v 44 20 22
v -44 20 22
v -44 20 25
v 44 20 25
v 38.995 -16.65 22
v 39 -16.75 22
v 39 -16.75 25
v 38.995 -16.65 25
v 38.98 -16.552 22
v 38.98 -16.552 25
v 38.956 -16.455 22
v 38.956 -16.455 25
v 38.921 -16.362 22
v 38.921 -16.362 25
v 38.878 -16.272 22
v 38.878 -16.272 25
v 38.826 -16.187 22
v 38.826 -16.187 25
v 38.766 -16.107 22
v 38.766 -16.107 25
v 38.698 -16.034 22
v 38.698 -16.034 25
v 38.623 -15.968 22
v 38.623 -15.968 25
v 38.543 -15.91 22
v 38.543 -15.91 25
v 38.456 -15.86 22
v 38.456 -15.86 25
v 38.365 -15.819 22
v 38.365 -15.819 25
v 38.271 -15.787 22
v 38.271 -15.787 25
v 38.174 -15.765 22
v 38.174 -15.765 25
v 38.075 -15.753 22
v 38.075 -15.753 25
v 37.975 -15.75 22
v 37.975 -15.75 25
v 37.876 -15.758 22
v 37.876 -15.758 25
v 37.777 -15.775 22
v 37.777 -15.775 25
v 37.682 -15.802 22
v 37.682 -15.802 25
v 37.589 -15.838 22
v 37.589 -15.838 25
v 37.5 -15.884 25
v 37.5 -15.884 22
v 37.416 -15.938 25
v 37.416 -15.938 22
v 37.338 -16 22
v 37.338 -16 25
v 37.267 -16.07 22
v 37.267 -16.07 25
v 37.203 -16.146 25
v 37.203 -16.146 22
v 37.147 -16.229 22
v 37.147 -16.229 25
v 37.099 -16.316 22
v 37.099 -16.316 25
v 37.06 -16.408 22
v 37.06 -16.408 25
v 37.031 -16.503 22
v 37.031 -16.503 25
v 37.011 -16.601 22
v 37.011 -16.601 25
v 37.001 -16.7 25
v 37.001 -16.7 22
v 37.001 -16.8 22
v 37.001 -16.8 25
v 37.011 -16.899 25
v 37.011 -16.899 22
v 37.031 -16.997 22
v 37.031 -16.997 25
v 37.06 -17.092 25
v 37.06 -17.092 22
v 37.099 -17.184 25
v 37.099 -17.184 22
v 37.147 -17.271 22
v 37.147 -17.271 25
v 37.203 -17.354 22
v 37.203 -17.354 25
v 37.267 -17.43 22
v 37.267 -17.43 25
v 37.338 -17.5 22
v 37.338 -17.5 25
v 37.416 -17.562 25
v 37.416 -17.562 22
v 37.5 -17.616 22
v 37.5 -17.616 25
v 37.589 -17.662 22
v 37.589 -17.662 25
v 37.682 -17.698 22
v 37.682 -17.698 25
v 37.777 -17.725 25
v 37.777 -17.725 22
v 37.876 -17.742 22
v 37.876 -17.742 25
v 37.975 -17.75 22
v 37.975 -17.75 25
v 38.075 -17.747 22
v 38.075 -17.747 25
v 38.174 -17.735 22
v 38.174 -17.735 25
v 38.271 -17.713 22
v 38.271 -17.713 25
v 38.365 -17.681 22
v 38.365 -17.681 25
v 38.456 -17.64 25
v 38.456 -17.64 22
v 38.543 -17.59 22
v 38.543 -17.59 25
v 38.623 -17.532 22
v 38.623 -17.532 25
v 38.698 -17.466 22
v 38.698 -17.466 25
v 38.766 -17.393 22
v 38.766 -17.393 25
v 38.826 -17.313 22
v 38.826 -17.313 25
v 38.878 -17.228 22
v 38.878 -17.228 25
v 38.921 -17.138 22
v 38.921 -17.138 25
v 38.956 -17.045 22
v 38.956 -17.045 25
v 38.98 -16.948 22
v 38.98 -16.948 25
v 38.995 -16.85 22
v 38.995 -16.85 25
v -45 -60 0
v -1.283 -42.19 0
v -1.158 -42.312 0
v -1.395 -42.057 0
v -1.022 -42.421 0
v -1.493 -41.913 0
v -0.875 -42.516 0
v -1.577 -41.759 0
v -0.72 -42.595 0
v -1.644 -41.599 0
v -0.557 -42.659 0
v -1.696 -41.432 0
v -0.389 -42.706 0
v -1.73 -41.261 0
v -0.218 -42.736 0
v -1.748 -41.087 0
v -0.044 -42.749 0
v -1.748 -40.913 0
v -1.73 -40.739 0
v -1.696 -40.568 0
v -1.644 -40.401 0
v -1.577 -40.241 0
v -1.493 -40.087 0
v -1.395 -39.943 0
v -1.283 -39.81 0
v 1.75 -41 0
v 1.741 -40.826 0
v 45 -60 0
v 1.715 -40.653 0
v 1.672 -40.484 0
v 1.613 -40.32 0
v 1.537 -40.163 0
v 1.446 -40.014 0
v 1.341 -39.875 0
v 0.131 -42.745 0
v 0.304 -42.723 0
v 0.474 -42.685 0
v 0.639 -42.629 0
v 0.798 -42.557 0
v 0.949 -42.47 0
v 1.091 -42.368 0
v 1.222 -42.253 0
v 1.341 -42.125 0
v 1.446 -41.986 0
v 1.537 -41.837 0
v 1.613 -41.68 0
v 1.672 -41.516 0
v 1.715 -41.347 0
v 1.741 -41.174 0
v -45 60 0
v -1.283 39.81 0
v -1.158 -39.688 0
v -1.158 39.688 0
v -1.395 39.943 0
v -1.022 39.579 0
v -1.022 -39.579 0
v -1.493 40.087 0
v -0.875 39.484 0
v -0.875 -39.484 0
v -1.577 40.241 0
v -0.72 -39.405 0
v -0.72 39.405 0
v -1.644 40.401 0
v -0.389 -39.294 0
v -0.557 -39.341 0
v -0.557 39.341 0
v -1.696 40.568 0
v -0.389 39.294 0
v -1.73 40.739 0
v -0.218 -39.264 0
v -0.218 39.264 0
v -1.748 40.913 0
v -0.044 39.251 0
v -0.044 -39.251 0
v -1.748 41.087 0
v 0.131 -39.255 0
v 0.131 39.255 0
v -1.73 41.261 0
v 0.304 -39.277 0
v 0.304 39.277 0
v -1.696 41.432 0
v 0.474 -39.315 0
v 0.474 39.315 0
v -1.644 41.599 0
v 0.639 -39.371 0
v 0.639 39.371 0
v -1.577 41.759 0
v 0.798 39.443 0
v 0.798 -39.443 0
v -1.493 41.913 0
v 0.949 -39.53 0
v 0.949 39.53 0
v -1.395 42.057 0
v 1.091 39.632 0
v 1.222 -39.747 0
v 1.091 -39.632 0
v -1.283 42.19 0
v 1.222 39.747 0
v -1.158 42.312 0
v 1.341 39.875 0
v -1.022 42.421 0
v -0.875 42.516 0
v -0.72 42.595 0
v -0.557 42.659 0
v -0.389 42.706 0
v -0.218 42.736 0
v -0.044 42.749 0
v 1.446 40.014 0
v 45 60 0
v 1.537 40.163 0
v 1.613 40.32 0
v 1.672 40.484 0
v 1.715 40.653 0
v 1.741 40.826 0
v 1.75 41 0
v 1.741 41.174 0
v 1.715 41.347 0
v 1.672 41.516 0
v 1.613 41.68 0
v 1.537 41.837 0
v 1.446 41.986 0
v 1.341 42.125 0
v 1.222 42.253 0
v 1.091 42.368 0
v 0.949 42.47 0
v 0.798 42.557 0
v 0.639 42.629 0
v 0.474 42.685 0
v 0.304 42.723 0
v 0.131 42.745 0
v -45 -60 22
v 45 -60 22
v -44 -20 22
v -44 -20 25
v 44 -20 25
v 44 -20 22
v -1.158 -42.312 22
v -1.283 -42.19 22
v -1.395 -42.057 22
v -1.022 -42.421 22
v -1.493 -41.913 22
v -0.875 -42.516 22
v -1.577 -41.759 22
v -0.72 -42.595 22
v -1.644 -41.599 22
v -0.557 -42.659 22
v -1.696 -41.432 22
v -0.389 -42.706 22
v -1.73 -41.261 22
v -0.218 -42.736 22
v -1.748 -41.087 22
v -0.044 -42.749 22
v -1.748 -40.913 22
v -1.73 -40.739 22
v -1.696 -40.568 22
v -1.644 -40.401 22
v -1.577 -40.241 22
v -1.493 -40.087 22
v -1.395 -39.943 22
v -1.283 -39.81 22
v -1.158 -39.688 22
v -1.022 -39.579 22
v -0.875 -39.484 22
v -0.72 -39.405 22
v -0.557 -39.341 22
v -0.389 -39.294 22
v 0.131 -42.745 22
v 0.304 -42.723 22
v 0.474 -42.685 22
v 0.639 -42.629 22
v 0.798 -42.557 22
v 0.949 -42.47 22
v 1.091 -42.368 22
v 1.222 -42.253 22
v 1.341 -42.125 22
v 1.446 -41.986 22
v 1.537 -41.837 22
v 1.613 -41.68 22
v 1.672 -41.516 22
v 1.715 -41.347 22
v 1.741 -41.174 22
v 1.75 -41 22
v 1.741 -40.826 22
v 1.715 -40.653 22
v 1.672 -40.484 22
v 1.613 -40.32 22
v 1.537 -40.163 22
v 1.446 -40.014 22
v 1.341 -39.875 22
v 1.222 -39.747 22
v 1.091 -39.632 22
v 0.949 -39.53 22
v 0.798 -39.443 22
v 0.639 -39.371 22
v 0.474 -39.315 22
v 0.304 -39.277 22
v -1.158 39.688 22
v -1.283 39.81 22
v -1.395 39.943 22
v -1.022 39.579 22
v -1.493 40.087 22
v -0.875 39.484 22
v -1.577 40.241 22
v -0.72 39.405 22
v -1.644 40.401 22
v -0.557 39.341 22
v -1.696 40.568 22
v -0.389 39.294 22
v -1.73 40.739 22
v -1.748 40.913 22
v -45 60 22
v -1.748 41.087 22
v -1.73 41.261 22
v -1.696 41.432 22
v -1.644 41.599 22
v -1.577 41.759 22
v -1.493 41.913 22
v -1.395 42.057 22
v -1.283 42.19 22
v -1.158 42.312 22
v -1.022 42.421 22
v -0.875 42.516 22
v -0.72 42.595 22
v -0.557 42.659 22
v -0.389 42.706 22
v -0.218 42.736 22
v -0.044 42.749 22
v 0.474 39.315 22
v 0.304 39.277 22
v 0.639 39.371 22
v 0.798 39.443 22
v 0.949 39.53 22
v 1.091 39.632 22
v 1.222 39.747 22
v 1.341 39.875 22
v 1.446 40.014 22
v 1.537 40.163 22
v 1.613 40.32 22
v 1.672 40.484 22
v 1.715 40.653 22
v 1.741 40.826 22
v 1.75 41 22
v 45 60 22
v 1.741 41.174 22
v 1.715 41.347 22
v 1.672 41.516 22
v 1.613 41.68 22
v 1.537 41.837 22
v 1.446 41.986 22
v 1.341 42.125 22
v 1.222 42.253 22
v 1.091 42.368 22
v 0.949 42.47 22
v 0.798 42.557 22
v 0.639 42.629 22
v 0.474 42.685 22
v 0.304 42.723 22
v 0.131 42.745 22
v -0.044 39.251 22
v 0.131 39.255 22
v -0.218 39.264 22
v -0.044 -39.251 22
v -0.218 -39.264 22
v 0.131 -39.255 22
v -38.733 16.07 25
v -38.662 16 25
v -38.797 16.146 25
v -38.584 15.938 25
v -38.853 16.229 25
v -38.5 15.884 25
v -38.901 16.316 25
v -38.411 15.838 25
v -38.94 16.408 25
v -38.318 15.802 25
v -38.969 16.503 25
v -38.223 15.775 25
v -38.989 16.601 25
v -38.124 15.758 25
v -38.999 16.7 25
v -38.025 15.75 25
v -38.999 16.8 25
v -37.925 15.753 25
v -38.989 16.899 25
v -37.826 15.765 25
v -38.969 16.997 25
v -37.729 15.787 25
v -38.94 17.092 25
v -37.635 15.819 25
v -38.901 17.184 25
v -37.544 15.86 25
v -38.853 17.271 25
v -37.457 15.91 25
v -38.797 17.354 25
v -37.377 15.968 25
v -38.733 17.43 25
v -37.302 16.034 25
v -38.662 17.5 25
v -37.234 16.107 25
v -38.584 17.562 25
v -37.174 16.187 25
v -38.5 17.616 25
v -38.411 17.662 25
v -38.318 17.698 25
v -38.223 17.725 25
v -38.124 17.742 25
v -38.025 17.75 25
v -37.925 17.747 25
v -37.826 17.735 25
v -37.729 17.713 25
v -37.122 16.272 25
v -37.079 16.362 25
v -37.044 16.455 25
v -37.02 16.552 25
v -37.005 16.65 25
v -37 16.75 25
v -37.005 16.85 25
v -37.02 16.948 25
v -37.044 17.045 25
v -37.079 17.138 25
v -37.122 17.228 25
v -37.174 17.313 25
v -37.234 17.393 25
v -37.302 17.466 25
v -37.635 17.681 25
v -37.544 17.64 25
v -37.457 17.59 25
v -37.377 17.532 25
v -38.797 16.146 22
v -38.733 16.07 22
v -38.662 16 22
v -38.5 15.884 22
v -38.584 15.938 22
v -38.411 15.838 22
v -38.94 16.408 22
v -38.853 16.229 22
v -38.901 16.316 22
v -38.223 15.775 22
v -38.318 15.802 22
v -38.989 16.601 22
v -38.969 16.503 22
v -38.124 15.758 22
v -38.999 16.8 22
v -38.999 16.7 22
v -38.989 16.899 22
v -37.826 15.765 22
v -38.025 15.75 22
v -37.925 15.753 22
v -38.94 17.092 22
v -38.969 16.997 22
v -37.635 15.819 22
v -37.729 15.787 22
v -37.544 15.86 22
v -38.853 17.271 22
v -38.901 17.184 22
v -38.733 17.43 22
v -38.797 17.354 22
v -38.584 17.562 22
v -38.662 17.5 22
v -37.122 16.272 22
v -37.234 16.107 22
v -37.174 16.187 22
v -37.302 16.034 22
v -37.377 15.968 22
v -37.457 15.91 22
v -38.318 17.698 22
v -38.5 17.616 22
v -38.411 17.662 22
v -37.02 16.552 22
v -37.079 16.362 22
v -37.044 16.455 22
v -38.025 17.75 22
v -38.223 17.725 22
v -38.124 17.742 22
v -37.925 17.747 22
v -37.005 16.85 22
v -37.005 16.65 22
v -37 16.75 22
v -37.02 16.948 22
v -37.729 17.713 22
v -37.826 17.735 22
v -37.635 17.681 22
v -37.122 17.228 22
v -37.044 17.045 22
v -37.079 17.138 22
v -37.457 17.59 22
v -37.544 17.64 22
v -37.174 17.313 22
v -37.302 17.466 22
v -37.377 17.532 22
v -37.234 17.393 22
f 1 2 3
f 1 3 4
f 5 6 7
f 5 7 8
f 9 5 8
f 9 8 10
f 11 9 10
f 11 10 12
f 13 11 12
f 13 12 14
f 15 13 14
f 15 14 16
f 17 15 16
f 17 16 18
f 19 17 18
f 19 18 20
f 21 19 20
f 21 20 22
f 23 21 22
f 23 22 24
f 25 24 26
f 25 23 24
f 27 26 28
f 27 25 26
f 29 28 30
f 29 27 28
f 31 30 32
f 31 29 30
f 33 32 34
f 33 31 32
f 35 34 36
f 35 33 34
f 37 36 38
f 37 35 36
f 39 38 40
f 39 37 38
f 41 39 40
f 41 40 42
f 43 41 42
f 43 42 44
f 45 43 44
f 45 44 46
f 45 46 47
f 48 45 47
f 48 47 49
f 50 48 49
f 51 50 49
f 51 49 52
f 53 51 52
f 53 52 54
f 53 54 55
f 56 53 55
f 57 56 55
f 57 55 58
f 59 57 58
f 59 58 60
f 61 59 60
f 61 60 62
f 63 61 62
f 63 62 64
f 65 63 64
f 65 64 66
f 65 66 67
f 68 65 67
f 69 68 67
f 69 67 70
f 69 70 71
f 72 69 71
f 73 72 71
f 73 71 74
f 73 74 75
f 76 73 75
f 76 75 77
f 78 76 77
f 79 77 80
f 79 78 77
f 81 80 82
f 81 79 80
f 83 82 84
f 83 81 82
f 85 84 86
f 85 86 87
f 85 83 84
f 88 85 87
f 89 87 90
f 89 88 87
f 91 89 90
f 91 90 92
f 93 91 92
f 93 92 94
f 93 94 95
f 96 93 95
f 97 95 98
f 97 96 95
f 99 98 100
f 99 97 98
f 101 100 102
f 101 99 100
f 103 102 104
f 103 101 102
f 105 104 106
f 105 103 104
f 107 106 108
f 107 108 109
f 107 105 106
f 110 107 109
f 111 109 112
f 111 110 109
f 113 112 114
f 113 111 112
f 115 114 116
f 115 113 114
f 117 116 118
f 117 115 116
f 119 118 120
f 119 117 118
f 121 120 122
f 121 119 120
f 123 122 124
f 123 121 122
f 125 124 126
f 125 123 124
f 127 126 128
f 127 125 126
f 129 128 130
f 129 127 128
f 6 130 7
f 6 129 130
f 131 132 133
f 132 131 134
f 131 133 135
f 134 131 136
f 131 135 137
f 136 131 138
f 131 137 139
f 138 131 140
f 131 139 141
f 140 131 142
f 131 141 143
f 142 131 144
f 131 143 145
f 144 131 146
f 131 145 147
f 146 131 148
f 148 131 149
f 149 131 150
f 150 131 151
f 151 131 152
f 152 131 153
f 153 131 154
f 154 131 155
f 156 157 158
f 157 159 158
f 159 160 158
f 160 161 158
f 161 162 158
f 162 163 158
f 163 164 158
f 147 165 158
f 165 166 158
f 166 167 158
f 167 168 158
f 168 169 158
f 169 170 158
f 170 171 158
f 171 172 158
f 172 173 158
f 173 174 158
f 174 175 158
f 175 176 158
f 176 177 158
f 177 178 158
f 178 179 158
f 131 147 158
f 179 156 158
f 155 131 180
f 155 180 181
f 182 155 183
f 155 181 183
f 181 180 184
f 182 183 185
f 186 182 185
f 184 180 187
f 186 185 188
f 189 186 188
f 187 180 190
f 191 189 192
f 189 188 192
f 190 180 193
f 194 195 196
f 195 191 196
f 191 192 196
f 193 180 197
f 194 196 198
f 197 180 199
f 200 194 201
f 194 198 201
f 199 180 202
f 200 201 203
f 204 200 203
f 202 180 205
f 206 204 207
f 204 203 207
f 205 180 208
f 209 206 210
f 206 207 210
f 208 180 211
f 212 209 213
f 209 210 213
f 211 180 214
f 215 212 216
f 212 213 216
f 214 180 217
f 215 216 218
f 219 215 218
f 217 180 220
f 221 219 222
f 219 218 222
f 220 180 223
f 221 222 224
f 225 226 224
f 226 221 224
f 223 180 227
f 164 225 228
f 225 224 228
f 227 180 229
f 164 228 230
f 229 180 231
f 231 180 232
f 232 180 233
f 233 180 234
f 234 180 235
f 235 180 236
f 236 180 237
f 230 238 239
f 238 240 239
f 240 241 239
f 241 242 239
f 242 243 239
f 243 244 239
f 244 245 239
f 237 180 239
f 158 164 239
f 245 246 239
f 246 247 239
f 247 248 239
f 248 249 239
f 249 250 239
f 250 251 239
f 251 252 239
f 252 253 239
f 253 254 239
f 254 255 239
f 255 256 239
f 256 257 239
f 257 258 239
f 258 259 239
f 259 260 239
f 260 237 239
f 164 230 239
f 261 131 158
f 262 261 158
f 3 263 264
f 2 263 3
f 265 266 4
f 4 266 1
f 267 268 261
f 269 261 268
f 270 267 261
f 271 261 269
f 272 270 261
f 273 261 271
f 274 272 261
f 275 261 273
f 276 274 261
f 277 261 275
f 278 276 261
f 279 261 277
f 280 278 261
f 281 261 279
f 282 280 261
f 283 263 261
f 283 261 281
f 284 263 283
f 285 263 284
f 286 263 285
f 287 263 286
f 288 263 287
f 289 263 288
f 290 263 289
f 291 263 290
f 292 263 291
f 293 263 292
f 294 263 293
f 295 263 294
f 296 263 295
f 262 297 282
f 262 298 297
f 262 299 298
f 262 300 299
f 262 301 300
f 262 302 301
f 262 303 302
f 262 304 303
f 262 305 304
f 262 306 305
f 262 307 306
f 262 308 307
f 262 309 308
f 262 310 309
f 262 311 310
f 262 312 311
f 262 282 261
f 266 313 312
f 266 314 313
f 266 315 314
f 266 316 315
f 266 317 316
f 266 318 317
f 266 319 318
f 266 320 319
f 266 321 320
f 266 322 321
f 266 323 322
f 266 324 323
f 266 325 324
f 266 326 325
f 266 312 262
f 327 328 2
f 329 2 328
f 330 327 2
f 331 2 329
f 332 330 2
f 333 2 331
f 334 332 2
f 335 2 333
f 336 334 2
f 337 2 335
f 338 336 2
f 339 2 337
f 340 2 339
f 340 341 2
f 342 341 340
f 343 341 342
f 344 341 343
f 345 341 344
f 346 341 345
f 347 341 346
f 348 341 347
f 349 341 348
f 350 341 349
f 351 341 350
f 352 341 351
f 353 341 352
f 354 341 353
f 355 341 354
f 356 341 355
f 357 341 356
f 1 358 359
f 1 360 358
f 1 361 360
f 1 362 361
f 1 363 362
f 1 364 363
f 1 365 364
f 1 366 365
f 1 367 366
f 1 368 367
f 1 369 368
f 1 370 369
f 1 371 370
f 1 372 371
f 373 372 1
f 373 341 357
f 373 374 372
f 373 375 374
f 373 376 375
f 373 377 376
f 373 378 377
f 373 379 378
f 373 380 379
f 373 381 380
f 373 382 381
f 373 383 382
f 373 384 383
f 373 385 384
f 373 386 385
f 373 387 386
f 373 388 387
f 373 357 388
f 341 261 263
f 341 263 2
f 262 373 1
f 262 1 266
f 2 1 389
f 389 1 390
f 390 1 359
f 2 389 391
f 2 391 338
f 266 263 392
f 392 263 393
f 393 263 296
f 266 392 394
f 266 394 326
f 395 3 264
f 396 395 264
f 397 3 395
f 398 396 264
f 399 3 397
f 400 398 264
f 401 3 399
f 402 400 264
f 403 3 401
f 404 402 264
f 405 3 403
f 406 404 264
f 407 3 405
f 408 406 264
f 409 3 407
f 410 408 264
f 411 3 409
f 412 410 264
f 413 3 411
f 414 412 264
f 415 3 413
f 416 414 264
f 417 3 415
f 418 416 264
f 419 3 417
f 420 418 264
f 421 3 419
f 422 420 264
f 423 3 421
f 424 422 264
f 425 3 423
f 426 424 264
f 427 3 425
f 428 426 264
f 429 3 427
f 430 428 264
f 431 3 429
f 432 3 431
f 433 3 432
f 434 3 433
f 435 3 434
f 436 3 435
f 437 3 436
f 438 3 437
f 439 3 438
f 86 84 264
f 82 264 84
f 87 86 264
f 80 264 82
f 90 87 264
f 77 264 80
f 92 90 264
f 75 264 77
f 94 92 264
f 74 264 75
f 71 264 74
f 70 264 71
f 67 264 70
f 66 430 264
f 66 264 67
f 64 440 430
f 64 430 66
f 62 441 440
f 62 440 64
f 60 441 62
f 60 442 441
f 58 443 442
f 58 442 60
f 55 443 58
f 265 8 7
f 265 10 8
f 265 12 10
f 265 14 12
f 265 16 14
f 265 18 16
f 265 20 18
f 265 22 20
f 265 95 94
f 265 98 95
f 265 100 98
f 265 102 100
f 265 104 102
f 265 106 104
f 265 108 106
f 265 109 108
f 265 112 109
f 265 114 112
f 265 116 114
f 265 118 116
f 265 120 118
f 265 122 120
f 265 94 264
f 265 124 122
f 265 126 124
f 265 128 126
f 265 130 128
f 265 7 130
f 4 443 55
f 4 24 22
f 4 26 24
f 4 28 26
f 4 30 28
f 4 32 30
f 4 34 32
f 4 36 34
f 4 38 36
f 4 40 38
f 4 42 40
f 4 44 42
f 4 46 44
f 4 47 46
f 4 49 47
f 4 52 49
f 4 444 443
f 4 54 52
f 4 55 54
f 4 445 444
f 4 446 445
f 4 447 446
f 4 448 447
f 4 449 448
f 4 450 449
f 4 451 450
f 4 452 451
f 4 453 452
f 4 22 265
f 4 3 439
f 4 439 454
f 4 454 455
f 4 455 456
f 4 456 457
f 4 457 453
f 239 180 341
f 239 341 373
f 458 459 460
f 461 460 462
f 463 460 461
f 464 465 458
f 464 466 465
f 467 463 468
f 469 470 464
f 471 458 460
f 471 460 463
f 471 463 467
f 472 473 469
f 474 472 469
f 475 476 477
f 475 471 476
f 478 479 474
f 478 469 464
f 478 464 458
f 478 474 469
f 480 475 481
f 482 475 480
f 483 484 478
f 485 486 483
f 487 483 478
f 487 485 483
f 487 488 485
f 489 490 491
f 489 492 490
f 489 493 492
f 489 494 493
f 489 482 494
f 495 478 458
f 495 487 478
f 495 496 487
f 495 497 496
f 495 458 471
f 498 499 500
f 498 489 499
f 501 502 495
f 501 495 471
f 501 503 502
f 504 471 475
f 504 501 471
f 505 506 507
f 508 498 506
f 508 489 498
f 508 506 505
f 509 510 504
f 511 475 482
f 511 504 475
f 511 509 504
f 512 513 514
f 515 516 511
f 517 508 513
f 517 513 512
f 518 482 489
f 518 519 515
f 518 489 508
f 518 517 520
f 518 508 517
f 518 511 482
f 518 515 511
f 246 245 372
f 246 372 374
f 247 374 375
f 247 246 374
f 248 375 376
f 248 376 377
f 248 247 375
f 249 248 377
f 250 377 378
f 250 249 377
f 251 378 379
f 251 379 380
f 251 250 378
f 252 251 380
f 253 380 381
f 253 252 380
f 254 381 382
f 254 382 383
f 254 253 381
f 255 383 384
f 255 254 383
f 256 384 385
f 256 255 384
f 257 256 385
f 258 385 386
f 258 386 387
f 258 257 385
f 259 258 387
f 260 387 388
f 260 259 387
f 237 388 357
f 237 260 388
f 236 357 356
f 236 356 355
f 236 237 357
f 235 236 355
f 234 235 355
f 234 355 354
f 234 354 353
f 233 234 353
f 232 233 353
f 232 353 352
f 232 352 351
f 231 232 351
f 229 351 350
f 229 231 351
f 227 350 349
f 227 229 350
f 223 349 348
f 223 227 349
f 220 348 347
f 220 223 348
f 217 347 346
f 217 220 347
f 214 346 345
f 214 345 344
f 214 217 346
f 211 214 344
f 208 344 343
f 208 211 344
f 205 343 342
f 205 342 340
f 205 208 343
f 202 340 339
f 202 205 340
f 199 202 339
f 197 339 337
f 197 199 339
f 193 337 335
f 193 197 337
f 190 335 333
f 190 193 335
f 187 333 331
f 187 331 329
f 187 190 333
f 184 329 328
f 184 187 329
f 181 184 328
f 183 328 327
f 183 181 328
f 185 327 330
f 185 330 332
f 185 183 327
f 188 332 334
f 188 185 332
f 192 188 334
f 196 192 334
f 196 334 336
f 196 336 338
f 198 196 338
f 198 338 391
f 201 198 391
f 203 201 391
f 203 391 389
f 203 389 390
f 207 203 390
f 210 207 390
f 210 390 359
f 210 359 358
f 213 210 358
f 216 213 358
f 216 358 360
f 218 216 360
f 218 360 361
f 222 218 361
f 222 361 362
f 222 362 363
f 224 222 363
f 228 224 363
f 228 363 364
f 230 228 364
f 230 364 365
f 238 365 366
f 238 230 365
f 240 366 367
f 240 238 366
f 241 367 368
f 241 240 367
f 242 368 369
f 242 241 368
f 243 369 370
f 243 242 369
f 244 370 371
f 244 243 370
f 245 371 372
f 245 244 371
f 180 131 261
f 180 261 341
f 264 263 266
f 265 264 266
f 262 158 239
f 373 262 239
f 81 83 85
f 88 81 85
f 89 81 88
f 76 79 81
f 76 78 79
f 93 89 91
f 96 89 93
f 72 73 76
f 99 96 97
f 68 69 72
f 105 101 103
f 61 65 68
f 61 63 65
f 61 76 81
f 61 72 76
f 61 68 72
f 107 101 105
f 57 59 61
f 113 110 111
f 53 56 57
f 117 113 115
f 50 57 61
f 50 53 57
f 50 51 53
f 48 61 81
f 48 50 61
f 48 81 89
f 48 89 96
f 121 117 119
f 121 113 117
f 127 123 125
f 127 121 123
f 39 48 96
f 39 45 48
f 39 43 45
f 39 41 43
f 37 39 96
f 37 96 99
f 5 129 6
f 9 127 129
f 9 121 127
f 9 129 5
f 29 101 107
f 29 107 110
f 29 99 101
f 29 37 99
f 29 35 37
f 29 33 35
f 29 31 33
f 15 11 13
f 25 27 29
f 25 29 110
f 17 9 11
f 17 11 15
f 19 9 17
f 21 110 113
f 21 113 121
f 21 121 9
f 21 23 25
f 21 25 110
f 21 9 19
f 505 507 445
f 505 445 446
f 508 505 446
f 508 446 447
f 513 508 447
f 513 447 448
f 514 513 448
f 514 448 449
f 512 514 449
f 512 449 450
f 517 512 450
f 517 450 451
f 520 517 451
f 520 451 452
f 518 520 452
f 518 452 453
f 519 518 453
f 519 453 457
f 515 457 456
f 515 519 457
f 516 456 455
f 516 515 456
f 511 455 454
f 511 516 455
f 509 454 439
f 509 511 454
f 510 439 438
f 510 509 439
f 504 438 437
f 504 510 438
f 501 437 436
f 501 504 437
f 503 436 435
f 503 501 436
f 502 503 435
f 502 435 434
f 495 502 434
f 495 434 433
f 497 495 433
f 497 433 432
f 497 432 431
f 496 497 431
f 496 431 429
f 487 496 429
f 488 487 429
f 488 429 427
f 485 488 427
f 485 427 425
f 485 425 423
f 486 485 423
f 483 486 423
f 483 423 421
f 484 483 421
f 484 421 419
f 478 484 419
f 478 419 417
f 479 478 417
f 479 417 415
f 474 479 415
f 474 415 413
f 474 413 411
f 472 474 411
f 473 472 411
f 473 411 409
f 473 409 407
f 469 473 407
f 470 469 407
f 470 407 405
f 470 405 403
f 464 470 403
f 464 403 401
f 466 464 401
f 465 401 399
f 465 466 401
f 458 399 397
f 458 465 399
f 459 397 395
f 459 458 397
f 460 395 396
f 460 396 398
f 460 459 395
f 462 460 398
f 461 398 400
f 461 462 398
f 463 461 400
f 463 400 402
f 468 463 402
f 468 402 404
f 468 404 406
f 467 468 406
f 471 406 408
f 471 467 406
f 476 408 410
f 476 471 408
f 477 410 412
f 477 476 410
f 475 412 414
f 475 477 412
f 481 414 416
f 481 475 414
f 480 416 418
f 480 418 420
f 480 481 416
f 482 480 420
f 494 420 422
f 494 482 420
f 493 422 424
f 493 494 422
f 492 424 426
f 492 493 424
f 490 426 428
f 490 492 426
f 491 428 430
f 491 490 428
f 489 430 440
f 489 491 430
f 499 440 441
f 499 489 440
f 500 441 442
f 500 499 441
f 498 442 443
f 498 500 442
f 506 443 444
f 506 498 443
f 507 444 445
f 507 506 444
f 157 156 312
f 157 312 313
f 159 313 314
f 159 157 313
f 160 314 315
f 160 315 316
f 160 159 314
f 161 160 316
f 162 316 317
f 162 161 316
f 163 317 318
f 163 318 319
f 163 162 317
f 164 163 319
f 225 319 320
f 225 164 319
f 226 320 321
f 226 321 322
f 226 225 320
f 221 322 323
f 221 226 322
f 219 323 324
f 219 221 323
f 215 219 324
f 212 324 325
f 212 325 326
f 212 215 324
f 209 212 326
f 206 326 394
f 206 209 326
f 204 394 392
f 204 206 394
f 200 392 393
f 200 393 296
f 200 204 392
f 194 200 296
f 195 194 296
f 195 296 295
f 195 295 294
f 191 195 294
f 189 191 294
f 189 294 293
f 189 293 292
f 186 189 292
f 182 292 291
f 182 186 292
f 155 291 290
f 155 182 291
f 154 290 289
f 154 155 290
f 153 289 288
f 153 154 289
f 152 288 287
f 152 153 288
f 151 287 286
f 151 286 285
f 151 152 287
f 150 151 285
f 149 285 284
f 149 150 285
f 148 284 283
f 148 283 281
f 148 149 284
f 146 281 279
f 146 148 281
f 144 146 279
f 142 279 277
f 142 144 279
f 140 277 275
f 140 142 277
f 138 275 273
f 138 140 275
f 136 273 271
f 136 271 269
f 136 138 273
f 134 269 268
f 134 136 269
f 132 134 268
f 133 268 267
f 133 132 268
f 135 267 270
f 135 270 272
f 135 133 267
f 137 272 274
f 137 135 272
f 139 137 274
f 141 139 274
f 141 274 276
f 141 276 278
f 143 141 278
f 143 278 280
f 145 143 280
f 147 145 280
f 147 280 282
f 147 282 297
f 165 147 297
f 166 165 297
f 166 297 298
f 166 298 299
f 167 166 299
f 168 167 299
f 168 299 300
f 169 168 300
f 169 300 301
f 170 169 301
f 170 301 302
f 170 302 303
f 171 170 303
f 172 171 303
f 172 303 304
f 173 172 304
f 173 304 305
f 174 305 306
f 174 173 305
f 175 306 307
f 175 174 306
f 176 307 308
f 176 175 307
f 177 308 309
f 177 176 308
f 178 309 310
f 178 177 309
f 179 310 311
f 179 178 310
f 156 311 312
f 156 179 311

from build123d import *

# Parameters (mm, degrees)
SKETCH1_W           = 90
SKETCH1_H           = 120
SKETCH1_R           = 1.75
BOSS_EXTRUDE1_DEPTH = 22
SKETCH3_W           = 88
SKETCH3_H           = 40
SKETCH3_R           = 1
BOSS_EXTRUDE2_DEPTH = 25


with BuildPart() as part:
    # Sketch1 → Boss-Extrude1 (new body)
    with BuildSketch(Plane.XY):
        Rectangle(SKETCH1_W, SKETCH1_H)
        with Locations((0, 41)):
            Circle(SKETCH1_R, mode=Mode.SUBTRACT)
        with Locations((0, -41)):
            Circle(SKETCH1_R, mode=Mode.SUBTRACT)
    extrude(amount=BOSS_EXTRUDE1_DEPTH)

    # Sketch3 → Boss-Extrude2 (add)
    with BuildSketch(Plane.XY):
        Rectangle(SKETCH3_W, SKETCH3_H)
        with Locations((-38, 16.75)):
            Circle(SKETCH3_R, mode=Mode.SUBTRACT)
        with Locations((38, -16.75)):
            Circle(SKETCH3_R, mode=Mode.SUBTRACT)
    extrude(amount=BOSS_EXTRUDE2_DEPTH)


solid = part.part
